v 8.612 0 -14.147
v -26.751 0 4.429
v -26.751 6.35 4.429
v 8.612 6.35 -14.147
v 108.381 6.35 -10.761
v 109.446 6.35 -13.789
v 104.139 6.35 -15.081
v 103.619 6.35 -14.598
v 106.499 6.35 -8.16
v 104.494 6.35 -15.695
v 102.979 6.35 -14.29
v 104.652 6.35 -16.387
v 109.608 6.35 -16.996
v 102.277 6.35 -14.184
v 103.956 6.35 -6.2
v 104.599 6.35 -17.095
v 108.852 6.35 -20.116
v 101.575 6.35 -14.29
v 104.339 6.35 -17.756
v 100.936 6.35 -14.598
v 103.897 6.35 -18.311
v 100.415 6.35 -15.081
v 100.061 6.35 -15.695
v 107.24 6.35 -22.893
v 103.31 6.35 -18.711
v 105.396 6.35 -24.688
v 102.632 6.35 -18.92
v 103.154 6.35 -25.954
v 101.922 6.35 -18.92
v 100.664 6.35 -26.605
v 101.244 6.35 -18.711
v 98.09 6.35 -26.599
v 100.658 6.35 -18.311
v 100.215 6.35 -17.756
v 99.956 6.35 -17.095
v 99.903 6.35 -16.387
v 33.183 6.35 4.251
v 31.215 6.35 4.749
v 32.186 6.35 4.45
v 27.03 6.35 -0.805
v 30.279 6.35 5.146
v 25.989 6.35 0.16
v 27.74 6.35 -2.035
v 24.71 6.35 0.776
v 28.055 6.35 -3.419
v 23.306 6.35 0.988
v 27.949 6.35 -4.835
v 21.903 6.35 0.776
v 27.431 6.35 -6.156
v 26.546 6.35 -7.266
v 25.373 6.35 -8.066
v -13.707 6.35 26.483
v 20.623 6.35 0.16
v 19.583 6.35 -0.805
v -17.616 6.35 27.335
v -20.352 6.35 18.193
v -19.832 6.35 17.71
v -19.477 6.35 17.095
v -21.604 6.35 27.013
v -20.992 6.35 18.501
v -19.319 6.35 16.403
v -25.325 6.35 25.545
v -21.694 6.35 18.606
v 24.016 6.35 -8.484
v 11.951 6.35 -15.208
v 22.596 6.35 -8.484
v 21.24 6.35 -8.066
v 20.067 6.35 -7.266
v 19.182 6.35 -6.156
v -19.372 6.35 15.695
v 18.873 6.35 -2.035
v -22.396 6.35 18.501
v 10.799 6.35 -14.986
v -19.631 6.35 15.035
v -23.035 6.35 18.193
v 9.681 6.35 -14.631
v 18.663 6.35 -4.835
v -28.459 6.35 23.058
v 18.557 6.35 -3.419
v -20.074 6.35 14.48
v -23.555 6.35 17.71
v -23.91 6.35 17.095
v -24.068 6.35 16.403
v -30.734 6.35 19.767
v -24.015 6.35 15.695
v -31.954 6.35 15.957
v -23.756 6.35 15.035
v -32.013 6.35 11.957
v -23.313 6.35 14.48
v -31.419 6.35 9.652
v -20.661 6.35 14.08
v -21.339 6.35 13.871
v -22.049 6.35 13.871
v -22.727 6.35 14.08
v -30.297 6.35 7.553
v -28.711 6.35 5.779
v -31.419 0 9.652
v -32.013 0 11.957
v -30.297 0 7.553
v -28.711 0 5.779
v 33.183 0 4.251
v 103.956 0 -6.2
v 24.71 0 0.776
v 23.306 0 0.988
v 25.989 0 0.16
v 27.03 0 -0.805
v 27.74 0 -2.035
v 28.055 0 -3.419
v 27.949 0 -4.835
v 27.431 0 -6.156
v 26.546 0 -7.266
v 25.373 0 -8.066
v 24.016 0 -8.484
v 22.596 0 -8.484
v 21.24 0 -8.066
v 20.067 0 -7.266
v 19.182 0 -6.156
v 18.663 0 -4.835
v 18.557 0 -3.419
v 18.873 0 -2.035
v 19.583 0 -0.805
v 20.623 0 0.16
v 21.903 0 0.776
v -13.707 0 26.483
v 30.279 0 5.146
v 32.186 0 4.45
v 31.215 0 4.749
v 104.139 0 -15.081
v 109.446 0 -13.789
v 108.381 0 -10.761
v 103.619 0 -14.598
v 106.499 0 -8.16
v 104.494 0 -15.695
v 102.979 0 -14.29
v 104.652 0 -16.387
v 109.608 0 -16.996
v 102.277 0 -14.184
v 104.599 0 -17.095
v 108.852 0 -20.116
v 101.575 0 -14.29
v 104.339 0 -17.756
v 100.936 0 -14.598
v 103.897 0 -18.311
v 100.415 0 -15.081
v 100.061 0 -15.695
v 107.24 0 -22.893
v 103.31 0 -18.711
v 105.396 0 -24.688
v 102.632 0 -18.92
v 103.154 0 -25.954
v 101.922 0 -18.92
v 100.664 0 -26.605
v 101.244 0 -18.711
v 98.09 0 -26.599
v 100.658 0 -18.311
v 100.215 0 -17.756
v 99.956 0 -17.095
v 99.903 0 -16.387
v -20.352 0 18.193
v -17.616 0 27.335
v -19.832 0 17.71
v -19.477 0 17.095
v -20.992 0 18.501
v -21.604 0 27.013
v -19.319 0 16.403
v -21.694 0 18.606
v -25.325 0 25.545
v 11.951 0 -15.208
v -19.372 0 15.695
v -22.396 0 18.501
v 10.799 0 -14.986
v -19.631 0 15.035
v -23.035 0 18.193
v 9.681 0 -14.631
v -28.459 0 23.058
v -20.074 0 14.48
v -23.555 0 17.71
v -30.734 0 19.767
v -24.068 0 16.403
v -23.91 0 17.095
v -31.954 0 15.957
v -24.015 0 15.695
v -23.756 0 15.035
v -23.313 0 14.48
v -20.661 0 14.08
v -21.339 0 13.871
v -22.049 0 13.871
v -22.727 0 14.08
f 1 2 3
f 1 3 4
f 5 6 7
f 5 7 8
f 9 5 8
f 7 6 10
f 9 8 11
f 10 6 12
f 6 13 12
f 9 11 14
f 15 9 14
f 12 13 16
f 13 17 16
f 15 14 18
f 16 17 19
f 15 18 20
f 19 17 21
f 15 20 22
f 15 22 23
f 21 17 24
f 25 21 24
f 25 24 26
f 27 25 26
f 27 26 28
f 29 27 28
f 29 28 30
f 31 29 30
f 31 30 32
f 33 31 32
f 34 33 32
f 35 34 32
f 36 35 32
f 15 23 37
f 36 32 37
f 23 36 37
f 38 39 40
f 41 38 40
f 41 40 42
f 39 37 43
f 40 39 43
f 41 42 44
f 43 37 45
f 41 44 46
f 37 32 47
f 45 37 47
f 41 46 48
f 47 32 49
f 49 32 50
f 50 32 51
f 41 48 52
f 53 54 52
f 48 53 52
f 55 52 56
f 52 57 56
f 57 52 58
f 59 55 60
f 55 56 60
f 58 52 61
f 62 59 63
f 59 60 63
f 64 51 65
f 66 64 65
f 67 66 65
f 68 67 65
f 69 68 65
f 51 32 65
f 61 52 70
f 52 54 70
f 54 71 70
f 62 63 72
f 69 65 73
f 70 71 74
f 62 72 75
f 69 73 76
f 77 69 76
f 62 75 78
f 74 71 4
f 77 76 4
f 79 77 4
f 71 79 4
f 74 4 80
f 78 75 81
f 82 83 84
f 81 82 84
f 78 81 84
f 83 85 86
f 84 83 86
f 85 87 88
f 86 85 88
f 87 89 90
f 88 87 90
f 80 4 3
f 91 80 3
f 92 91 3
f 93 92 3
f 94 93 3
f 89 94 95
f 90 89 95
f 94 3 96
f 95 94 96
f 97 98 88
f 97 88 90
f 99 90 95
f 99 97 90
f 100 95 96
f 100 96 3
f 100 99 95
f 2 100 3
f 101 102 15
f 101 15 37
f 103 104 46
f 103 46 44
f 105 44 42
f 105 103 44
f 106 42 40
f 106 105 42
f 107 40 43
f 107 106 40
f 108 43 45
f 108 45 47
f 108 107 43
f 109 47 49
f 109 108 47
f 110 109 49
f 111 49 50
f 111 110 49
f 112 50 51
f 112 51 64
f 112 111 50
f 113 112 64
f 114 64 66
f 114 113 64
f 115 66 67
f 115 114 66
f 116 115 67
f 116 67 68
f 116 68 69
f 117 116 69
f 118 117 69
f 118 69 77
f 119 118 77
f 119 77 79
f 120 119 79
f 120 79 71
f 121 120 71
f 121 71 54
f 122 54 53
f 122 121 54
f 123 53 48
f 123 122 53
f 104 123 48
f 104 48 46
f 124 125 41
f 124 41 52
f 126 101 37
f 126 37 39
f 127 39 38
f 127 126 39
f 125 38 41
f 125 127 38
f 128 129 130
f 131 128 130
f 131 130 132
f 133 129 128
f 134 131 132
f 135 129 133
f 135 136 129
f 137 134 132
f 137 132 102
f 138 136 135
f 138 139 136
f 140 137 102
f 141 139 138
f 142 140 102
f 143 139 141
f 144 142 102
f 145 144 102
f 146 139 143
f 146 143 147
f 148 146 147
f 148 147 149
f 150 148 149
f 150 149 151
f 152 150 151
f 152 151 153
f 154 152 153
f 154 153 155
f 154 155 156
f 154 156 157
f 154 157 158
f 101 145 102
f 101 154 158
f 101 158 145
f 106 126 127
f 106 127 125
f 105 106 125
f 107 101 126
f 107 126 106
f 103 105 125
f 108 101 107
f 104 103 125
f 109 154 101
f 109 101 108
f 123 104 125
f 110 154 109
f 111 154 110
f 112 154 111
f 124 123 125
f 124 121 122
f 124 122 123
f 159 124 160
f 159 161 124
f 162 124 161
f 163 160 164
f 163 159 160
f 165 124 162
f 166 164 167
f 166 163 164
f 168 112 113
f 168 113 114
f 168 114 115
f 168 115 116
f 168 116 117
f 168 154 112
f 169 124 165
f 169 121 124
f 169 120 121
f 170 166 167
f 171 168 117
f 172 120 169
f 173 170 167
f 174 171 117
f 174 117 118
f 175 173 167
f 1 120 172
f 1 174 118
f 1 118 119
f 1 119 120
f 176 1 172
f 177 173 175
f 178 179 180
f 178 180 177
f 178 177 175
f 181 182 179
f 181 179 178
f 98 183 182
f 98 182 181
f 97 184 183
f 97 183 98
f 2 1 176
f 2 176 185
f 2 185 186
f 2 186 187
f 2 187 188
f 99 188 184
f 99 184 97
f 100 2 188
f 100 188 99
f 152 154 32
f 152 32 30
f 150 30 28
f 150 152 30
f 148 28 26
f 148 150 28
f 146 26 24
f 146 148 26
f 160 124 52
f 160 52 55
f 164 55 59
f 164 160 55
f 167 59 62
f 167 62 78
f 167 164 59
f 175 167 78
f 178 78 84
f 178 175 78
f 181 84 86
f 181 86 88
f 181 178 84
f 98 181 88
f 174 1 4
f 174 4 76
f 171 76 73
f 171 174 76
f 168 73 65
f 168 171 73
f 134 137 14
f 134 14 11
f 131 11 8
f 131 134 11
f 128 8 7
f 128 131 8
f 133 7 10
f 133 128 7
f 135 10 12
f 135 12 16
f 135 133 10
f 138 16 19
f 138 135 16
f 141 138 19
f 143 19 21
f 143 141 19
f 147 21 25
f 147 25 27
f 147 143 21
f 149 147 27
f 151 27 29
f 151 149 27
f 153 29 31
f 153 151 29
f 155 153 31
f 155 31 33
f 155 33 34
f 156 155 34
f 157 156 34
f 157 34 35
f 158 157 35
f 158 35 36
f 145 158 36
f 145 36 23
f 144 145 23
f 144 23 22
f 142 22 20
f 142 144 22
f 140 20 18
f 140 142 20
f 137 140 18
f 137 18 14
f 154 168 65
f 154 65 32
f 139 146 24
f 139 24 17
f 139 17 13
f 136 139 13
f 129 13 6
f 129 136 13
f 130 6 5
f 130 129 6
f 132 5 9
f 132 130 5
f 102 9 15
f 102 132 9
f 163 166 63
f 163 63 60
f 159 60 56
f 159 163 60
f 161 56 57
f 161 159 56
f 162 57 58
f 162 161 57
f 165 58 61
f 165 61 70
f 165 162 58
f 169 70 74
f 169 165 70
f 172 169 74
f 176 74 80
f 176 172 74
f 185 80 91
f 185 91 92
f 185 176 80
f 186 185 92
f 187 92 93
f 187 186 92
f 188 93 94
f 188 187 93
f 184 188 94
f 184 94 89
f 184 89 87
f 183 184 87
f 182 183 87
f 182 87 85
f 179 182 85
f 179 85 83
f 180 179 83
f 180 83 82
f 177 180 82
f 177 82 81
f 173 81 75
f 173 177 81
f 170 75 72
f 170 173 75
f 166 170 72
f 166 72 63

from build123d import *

# Parameters (mm, degrees)
CROQUIS1_R              = 2.38125
CROQUIS1_R_2            = 4.7625
SALIENTE_EXTRUIR1_DEPTH = 6.35


with BuildPart() as part:
    # Croquis1 → Saliente-Extruir1 (new body)
    with BuildSketch(Plane(origin=(0, 0, 0), x_dir=(1, 0, 0), z_dir=(0, 1, 0))):
        with BuildLine():
            Line((103.955940895, 6.200359073), (33.182720339, -4.250520887))
            ThreePointArc((33.182720339, -4.250520887), (31.696731466, -4.587290217), (30.279155254, -5.145908331))
            Line((30.279155254, -5.145908331), (-13.707132326, -26.482618703))
            ThreePointArc((-13.707132326, -26.482618703), (-26.984336102, -24.417368961), (-32.012638404, -11.956808276))
            ThreePointArc((-32.012638404, -11.956808276), (-30.297252372, -7.553267867), (-26.751302562, -4.429174828))
            Line((-26.751302562, -4.429174828), (8.61159414, 14.14717195))
            ThreePointArc((8.61159414, 14.14717195), (10.234533943, 14.825001148), (11.951126741, 15.208009235))
            Line((11.951126741, 15.208009235), (98.089879586, 26.598503543))
            ThreePointArc((98.089879586, 26.598503543), (103.154358957, 25.953614792), (107.240482188, 22.892825721))
            ThreePointArc((107.240482188, 22.892825721), (109.446452134, 13.78938225), (103.955940895, 6.200359073))
        make_face()
        with Locations(Location((102.277188424, 16.565289857, 0), (0, 0, 270))):
            Circle(CROQUIS1_R, mode=Mode.SUBTRACT)
        with Locations(Location((23.306287218, 3.774794841, 0), (0, 0, 270))):
            Circle(CROQUIS1_R_2, mode=Mode.SUBTRACT)
        with Locations(Location((-21.693712782, -16.225205159, 0), (0, 0, 270))):
            Circle(CROQUIS1_R, mode=Mode.SUBTRACT)
    extrude(amount=SALIENTE_EXTRUIR1_DEPTH)


solid = part.part
